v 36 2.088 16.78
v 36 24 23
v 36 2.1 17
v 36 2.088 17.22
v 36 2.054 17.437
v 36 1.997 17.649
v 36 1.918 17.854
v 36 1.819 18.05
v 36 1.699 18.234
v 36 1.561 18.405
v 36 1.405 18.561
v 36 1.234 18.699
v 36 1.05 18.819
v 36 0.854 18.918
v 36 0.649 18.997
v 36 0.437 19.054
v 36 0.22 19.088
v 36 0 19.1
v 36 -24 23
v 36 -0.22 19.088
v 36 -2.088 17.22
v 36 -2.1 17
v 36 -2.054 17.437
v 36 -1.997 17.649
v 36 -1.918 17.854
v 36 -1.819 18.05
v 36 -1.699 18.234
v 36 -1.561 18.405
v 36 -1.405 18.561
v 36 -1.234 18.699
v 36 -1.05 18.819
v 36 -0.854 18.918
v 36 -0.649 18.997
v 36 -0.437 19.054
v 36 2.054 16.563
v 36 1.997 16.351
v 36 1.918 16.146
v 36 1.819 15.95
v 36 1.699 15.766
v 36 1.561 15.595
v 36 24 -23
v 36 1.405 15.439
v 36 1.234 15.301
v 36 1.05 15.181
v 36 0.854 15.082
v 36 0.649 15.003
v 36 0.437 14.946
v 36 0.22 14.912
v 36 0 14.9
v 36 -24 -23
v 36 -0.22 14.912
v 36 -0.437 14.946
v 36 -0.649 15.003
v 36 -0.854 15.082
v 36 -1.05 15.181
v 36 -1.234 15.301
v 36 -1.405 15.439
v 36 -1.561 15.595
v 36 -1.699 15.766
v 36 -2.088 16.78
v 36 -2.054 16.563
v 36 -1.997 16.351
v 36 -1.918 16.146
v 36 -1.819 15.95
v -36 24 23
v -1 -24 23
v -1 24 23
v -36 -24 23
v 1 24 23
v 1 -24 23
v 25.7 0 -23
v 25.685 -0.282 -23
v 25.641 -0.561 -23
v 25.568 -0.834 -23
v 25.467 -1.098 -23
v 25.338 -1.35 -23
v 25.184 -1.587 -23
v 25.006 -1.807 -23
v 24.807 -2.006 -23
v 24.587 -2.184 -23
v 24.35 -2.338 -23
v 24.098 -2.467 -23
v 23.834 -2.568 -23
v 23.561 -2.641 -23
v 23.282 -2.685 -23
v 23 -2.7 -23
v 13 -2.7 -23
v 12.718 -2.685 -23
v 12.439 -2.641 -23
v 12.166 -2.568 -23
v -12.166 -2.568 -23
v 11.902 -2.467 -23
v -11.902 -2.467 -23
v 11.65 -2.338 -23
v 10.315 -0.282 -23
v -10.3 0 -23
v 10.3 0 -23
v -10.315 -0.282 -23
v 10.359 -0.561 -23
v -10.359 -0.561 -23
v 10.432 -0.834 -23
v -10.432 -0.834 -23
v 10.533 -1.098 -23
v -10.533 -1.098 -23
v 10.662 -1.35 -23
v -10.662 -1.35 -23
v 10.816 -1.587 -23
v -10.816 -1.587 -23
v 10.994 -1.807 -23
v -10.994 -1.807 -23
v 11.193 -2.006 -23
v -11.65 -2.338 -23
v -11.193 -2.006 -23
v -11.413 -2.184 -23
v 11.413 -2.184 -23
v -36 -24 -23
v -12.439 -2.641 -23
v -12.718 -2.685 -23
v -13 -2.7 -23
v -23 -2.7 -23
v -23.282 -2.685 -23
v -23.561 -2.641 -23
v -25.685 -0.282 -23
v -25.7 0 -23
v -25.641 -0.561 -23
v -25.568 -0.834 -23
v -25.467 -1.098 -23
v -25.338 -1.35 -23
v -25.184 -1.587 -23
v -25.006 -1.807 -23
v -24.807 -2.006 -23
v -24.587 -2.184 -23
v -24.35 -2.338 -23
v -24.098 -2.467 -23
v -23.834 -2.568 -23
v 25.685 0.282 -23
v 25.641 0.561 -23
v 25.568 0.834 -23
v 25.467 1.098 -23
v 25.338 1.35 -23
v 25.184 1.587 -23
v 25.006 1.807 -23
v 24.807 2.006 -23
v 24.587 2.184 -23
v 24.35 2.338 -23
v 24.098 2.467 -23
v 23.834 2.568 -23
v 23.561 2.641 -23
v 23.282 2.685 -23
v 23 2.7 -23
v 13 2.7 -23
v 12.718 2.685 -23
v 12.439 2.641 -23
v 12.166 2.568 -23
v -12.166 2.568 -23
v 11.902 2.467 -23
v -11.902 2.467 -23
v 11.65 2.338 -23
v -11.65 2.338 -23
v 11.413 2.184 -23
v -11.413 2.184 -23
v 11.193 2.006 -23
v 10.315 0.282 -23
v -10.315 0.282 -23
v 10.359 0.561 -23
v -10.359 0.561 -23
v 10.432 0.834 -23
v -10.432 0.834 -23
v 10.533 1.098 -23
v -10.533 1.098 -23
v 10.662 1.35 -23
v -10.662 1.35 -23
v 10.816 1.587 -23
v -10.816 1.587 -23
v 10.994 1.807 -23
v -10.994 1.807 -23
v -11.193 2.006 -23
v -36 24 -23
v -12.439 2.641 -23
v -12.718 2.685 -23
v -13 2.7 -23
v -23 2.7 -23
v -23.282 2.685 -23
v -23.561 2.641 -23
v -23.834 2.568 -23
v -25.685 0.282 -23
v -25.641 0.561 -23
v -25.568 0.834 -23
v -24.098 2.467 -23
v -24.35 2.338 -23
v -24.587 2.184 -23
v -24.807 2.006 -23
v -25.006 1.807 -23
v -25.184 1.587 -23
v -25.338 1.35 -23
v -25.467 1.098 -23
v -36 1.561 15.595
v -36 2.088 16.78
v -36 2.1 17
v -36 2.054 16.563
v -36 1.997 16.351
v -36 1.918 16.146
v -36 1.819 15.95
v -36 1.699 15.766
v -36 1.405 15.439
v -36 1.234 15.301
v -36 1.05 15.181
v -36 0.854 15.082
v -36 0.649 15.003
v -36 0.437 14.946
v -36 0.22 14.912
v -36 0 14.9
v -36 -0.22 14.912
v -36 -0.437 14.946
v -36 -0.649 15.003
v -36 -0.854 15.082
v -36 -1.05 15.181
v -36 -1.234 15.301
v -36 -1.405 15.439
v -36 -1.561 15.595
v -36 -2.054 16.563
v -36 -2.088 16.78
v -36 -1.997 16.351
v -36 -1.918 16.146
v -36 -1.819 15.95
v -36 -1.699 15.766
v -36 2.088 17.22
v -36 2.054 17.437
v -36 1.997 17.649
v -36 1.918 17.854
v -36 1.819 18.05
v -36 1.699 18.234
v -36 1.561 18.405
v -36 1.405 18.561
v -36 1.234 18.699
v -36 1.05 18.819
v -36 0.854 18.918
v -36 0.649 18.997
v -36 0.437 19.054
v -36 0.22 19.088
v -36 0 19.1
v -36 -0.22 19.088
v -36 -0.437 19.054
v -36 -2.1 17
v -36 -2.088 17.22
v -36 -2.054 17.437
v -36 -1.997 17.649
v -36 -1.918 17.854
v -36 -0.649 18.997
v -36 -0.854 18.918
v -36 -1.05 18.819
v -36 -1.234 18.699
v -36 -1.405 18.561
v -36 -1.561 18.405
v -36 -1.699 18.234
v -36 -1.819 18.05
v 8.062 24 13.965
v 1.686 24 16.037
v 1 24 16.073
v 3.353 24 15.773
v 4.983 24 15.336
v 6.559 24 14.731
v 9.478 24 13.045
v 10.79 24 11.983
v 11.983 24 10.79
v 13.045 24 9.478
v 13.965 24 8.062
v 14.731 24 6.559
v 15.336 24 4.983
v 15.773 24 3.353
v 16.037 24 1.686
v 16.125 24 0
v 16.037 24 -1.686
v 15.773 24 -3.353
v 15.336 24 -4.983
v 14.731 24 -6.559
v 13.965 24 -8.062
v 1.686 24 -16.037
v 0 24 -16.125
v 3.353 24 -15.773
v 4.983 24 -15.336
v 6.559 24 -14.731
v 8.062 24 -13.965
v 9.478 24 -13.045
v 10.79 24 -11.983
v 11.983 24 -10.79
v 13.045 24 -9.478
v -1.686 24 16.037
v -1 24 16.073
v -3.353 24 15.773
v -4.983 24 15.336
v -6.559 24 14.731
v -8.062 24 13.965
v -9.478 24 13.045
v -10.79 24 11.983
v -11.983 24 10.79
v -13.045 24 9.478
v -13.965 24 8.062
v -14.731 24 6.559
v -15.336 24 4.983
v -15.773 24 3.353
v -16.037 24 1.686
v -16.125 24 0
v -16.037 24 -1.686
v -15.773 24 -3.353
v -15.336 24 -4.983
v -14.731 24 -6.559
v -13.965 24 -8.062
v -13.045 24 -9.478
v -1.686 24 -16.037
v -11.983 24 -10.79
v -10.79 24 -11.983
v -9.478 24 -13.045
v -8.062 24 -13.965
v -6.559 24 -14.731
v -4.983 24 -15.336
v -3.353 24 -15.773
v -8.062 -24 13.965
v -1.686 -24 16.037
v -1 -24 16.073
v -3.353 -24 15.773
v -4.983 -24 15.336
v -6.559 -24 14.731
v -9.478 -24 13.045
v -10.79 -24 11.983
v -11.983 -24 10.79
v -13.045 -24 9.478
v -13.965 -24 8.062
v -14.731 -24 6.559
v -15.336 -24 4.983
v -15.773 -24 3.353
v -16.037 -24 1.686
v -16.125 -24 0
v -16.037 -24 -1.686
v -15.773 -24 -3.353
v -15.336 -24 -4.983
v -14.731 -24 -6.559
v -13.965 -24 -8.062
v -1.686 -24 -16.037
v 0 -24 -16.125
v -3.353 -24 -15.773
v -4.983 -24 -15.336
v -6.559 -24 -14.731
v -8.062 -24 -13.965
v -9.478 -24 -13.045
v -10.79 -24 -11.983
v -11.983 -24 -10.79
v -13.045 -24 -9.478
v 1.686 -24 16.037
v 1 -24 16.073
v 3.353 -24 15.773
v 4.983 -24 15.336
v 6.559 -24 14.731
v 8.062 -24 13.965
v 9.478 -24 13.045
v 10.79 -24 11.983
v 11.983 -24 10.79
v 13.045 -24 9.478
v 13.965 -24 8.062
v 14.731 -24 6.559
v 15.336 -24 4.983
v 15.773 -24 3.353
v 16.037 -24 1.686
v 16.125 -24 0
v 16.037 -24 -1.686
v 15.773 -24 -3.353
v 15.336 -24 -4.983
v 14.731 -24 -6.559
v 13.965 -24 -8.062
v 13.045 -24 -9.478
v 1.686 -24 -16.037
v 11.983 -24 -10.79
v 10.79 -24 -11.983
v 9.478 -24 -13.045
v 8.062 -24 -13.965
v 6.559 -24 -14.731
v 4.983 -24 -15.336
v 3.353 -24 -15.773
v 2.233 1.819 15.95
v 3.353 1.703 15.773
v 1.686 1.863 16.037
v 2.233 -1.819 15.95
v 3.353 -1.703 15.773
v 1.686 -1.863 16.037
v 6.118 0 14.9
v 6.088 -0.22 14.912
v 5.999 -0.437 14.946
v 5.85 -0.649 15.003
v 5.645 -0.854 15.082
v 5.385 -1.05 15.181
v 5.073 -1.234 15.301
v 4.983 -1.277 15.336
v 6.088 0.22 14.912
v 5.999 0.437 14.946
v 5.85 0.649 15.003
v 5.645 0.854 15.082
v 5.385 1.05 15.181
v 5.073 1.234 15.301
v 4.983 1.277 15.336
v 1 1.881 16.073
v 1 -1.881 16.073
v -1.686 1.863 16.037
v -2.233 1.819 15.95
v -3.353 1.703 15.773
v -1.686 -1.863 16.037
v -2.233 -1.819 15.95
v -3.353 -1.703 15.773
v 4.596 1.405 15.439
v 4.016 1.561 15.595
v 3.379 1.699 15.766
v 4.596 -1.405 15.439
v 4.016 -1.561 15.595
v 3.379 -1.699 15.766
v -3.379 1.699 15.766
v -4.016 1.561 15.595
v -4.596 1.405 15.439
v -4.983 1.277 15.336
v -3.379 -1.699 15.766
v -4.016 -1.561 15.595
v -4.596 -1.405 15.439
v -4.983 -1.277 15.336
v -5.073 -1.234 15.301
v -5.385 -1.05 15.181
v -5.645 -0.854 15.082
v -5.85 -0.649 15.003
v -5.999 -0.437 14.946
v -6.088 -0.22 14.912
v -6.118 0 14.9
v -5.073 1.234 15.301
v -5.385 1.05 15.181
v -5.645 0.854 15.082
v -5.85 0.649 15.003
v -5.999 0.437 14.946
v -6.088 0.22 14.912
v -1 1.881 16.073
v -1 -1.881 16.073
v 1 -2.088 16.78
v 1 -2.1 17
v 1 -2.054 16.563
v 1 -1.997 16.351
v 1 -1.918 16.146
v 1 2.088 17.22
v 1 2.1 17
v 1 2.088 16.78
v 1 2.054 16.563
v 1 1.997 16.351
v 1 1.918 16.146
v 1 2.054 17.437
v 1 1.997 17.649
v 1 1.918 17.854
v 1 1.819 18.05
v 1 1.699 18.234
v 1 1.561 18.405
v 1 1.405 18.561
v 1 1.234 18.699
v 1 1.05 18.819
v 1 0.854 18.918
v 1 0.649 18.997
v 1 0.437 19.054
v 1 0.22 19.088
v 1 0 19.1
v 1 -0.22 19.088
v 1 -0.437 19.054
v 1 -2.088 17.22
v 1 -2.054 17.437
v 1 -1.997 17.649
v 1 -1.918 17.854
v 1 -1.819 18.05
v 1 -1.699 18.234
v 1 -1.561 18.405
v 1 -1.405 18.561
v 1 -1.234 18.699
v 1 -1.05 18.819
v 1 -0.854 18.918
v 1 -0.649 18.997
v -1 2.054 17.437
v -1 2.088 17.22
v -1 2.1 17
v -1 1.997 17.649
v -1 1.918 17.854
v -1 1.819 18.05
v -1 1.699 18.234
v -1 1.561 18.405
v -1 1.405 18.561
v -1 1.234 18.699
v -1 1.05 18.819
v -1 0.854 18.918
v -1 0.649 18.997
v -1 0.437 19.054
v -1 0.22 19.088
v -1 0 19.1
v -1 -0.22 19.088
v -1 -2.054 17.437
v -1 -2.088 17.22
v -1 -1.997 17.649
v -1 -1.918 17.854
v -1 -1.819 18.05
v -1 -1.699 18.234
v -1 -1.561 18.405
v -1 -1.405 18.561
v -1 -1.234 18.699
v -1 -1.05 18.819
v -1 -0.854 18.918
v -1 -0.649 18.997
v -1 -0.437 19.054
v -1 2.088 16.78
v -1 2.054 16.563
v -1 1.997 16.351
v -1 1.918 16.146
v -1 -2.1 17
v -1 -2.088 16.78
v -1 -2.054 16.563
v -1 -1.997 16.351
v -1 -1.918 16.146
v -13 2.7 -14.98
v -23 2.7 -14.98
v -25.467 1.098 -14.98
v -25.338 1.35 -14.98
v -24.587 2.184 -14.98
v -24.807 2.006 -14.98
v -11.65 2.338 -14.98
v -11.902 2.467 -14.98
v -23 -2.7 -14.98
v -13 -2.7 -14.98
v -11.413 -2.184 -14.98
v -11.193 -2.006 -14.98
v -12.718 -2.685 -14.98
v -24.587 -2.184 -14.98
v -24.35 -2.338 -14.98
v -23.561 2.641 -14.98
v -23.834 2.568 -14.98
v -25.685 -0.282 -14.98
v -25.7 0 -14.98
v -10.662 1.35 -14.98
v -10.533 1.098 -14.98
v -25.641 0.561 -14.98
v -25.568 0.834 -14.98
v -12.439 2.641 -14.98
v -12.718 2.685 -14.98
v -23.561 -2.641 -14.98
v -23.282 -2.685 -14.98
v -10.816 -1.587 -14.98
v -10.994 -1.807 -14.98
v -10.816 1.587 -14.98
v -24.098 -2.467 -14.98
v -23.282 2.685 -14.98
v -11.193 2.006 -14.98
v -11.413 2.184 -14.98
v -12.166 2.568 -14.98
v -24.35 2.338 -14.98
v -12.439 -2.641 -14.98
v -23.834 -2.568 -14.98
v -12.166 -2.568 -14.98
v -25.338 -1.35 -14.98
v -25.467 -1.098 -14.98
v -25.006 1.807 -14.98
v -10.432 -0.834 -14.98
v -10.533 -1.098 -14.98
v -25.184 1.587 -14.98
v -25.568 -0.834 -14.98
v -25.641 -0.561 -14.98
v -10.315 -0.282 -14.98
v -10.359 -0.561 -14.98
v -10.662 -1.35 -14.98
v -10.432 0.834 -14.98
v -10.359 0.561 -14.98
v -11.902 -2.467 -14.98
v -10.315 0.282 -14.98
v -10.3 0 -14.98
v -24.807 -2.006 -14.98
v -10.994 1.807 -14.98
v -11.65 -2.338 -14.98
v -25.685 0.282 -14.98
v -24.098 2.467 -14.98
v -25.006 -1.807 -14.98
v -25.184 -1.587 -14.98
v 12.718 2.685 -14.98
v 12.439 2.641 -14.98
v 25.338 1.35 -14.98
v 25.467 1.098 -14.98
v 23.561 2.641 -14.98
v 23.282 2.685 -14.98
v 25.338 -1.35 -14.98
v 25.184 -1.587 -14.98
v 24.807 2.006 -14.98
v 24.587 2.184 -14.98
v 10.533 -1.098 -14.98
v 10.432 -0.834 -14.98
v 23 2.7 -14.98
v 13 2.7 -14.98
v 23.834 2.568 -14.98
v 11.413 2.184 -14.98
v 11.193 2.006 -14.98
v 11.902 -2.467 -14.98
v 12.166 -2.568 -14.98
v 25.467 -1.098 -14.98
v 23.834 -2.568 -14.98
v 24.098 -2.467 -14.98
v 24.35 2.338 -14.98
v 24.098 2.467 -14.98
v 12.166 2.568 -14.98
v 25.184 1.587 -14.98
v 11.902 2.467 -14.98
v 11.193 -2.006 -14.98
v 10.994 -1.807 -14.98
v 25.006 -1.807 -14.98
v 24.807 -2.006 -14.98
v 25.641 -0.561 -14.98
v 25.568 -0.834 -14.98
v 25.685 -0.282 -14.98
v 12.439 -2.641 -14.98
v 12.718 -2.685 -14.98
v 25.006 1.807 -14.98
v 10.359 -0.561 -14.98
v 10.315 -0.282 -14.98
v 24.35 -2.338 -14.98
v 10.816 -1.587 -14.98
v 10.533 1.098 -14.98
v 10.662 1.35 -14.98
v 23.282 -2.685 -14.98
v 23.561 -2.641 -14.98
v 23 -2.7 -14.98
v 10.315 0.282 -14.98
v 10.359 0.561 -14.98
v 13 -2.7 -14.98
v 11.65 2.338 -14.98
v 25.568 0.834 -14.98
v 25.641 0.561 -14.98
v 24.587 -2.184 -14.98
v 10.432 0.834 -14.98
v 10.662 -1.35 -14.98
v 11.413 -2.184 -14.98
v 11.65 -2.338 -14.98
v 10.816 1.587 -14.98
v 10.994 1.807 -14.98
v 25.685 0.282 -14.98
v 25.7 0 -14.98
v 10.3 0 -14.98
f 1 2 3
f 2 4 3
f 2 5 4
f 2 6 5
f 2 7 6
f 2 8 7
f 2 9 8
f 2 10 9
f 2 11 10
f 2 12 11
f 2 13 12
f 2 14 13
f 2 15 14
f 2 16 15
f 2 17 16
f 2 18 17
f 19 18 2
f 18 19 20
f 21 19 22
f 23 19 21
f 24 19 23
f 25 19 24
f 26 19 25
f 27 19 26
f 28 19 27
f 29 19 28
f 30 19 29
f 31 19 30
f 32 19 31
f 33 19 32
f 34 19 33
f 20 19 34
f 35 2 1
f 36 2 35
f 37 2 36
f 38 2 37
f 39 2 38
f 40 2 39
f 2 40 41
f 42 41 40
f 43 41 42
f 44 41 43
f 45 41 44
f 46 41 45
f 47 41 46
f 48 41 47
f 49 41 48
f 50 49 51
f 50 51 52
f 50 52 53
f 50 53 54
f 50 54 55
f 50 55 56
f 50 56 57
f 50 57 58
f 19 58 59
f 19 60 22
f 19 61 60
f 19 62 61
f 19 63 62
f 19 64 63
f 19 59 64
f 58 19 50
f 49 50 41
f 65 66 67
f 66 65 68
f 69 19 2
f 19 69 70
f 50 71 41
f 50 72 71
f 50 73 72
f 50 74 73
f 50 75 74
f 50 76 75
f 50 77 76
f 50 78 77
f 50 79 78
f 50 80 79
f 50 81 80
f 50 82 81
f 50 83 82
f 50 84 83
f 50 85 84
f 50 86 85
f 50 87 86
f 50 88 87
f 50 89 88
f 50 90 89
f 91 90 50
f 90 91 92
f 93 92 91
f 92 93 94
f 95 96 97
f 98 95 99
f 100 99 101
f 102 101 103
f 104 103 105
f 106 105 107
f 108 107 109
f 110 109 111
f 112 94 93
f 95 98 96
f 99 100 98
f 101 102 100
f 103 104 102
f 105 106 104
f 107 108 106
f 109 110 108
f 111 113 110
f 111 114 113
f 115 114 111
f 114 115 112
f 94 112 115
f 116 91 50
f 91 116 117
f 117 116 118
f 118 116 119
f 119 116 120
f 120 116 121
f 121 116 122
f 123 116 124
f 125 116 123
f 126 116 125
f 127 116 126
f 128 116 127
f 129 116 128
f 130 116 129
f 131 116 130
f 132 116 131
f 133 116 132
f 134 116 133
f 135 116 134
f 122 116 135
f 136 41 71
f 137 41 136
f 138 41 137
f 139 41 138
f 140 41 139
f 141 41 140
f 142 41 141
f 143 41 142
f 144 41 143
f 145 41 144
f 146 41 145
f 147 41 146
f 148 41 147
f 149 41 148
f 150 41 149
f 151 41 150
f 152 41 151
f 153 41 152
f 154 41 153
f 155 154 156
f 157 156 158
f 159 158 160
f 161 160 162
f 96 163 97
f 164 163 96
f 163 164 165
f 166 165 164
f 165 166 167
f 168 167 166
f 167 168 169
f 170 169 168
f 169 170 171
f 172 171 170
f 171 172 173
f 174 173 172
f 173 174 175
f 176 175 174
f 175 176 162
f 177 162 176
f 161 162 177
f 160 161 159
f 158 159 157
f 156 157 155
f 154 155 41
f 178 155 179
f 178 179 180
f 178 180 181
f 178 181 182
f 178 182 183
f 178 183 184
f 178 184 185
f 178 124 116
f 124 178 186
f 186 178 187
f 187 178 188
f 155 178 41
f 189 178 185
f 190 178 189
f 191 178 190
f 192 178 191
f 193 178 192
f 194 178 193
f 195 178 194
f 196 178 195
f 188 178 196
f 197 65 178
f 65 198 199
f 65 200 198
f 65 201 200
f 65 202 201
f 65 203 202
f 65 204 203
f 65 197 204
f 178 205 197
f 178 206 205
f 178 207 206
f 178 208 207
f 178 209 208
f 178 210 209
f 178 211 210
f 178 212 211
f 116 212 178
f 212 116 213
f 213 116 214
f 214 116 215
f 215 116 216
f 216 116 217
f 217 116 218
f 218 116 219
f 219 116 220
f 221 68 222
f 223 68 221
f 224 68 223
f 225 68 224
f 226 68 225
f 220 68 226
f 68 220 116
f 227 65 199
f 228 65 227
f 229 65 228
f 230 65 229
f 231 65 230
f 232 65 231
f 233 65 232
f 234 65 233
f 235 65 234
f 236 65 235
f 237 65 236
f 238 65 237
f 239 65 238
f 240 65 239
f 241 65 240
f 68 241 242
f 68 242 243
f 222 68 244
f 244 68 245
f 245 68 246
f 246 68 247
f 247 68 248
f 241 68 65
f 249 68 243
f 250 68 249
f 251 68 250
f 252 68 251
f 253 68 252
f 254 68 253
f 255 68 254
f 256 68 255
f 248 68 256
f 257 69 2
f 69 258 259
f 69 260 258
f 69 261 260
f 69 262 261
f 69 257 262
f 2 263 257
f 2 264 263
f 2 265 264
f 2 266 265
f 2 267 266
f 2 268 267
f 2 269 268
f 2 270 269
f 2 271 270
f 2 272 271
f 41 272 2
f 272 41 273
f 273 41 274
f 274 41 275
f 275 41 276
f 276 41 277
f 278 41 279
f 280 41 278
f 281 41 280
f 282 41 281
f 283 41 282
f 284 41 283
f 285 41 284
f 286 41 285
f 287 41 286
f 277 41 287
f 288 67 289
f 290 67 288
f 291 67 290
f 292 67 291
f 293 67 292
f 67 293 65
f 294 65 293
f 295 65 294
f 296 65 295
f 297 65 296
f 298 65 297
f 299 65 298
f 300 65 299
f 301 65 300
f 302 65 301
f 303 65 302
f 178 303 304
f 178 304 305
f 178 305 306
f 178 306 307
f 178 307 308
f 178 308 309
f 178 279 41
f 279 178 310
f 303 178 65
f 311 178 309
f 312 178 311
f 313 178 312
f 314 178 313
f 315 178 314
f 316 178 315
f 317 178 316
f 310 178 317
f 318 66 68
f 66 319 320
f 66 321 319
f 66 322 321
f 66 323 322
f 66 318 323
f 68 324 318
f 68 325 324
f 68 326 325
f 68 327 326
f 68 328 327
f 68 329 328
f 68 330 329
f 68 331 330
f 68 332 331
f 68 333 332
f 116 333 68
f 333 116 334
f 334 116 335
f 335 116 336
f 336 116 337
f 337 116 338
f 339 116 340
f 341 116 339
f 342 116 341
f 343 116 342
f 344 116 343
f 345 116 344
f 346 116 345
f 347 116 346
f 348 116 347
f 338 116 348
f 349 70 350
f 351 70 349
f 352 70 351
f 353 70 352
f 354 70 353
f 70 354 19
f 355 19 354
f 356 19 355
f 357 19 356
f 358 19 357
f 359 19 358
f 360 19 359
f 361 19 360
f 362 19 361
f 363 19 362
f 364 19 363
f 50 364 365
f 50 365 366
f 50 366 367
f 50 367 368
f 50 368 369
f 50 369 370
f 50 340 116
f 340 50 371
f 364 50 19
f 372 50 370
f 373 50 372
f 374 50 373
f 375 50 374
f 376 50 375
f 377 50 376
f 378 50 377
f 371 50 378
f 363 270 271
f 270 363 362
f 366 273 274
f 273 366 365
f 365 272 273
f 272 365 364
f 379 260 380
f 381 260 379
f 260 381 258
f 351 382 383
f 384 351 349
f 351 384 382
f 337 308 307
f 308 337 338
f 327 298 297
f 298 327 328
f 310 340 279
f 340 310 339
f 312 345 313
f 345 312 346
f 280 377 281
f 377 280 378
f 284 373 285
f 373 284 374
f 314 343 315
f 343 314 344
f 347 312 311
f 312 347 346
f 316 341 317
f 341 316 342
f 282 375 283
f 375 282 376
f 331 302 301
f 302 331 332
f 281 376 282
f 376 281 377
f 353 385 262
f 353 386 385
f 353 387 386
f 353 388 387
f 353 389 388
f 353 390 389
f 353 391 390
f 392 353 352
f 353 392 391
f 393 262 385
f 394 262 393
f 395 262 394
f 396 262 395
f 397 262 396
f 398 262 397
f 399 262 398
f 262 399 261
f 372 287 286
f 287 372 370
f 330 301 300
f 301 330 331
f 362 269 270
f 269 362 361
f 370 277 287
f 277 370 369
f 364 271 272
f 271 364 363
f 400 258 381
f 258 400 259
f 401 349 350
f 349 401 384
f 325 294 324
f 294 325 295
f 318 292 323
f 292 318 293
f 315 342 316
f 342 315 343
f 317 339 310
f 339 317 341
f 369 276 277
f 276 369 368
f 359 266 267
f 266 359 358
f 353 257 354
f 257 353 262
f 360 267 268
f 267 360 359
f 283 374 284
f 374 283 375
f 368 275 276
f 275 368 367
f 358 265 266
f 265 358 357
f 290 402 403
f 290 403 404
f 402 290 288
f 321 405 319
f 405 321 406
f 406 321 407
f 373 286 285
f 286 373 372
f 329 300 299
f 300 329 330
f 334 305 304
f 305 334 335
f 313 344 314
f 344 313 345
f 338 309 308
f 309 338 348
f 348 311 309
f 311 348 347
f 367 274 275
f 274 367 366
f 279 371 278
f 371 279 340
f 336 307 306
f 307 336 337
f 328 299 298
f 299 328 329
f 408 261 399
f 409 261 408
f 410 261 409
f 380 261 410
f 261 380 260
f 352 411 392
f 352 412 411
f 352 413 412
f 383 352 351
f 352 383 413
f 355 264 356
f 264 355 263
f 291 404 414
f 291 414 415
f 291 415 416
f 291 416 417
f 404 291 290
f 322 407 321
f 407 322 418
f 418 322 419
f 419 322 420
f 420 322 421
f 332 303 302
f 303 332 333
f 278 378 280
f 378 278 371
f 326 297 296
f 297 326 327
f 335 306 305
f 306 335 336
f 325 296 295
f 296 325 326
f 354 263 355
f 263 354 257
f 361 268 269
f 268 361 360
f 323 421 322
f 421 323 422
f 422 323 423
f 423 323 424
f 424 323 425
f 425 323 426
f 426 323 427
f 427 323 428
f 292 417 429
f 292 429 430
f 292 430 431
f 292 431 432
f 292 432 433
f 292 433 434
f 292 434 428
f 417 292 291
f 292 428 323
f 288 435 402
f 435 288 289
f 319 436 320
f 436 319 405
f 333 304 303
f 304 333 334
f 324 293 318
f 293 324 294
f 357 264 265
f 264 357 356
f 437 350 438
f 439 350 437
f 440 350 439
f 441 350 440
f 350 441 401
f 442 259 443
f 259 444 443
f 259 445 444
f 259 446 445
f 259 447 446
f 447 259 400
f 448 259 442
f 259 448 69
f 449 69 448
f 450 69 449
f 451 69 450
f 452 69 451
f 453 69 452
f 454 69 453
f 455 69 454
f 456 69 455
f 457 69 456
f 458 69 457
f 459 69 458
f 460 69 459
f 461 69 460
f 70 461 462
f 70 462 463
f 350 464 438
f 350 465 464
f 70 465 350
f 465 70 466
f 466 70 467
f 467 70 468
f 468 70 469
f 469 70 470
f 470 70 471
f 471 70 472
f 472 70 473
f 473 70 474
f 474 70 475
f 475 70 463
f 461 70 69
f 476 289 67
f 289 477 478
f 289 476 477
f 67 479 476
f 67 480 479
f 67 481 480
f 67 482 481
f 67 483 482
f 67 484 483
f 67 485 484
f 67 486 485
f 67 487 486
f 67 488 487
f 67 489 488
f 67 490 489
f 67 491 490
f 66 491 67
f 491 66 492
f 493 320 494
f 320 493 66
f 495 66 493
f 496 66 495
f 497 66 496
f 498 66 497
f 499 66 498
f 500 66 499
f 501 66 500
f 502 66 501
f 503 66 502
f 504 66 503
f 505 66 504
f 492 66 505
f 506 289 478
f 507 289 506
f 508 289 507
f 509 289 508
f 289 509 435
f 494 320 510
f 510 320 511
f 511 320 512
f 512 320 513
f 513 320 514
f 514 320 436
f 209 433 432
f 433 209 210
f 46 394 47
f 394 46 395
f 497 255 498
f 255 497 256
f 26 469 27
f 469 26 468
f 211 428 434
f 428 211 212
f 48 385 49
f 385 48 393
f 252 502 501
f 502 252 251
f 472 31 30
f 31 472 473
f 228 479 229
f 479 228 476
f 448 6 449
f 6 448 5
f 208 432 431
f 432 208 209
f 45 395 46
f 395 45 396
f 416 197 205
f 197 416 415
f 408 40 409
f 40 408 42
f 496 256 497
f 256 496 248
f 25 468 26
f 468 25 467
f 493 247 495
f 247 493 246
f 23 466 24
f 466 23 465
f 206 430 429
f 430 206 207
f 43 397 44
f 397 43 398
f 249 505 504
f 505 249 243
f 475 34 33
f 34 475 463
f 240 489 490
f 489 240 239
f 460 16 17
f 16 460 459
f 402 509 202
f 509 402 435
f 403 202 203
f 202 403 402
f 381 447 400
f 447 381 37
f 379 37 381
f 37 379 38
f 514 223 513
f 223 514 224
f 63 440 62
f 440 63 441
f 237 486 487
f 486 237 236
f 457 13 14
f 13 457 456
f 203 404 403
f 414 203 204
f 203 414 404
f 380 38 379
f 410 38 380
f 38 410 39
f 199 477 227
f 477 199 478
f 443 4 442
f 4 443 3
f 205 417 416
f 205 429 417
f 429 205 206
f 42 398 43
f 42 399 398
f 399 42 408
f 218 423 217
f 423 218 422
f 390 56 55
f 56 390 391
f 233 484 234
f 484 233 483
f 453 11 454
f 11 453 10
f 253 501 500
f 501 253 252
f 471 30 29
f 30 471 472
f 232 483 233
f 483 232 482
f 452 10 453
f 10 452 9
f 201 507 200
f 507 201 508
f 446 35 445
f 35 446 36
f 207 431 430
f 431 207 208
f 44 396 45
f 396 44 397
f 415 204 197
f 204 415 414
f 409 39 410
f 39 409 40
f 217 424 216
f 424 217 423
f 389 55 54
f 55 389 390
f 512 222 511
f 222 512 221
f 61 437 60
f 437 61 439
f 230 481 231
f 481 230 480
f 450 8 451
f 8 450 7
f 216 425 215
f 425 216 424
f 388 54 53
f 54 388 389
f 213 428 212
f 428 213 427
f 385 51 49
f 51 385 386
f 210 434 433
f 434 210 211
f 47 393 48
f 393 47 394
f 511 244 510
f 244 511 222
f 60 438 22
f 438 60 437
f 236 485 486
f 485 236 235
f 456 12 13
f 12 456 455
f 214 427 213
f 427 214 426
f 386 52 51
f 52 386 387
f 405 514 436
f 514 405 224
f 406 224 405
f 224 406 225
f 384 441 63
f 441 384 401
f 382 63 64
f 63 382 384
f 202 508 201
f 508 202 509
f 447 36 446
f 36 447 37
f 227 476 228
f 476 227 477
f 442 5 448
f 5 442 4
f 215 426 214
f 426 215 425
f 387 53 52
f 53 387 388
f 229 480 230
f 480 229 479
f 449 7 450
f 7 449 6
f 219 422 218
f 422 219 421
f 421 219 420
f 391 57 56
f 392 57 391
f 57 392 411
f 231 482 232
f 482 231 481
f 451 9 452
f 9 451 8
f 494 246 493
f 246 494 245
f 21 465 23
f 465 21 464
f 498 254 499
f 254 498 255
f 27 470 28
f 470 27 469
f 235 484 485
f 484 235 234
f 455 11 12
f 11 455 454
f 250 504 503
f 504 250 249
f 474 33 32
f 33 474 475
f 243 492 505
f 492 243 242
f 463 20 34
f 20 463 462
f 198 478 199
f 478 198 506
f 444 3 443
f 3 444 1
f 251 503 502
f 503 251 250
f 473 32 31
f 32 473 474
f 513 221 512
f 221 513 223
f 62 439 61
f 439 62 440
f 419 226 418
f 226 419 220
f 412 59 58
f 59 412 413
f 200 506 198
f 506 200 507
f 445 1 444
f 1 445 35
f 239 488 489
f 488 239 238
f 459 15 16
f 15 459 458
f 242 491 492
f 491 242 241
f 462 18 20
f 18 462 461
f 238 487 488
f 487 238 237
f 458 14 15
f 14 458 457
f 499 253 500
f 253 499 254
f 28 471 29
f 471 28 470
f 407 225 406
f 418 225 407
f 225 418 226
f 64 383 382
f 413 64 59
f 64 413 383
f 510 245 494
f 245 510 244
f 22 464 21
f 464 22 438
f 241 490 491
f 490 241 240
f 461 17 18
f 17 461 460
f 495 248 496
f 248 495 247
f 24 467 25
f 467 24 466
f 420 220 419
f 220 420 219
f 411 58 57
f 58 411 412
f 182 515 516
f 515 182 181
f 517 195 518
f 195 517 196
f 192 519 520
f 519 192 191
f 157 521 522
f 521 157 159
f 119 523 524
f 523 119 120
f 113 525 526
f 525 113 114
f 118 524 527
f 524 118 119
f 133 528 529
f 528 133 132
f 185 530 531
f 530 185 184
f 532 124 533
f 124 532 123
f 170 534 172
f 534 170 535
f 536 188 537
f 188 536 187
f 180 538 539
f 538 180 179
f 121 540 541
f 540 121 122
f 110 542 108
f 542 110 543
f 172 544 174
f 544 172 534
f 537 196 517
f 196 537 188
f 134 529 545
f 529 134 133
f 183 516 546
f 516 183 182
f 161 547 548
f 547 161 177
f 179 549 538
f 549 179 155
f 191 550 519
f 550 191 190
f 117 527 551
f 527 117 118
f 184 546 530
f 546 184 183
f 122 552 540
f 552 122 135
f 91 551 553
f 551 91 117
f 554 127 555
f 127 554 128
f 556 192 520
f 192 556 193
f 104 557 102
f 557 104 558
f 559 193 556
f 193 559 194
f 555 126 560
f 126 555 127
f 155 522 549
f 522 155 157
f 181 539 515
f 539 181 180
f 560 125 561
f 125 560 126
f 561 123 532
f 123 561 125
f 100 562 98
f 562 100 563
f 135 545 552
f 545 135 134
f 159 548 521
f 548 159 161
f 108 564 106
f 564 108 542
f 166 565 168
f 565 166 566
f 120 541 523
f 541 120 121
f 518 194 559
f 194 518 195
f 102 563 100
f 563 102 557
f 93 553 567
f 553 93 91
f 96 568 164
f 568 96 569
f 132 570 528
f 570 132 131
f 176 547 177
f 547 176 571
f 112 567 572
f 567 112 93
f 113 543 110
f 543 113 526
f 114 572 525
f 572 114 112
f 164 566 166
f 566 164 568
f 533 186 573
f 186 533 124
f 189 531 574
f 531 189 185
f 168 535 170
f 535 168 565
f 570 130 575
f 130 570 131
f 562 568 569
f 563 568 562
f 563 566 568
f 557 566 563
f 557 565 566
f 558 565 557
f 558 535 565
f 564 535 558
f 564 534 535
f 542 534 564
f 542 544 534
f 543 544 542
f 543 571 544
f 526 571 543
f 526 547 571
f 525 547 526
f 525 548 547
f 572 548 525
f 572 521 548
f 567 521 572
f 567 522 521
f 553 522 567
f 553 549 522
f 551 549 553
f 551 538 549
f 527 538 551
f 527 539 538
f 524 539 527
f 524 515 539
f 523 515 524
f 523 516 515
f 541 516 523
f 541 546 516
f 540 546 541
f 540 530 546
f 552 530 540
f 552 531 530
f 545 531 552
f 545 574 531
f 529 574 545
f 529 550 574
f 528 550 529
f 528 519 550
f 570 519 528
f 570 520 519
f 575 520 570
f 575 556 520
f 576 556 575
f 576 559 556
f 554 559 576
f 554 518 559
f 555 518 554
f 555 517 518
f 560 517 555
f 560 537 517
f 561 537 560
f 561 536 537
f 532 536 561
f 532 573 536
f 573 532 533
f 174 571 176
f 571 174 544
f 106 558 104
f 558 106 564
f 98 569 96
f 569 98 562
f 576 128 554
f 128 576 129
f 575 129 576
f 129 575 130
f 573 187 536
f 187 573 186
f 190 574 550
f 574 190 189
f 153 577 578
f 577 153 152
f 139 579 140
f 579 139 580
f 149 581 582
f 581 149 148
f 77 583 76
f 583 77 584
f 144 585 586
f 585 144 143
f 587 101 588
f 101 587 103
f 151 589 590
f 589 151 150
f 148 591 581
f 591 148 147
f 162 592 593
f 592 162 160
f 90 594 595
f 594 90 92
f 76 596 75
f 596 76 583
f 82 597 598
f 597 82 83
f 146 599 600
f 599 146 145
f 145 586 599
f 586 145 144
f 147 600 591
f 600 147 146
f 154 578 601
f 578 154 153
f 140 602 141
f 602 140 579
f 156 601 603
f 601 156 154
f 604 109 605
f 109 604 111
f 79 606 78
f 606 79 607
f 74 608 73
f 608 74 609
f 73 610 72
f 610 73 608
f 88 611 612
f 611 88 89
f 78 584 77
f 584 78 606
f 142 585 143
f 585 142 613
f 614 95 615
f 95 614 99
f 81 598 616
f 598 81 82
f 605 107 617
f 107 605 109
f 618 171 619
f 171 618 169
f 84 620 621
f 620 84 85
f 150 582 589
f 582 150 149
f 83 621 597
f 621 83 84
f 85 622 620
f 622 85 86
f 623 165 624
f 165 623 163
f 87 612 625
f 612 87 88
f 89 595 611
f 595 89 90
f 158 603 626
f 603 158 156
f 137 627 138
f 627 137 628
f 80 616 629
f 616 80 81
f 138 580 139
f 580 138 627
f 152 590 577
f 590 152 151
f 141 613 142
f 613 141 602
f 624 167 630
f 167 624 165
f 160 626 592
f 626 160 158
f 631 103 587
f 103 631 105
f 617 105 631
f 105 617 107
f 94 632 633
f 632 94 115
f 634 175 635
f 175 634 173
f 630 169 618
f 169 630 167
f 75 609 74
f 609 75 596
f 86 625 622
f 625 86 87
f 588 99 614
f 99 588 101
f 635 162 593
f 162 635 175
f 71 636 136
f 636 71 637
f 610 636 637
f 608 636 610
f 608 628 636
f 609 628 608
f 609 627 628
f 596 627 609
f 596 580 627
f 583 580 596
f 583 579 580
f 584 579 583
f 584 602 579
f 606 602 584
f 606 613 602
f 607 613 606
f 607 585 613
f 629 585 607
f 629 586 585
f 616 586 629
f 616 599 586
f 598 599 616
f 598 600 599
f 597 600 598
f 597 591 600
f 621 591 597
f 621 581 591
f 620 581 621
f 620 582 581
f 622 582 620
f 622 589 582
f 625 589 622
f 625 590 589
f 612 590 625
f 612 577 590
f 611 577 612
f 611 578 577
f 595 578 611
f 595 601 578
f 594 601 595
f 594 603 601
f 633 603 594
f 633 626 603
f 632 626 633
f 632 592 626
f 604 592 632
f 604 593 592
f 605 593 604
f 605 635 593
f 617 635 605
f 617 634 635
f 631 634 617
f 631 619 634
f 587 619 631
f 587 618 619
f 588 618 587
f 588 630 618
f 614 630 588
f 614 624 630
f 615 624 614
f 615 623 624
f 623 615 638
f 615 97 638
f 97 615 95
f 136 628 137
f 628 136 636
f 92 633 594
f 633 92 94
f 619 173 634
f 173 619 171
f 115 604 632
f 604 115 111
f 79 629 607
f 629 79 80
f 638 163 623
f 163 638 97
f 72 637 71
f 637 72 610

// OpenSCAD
// Split housing for 32 mm OD linear bearing.
$fn = 60;
eps = 0.02;
bearing_d = 32;
body_l = 72;
body_d = 48;
body_h = 46;
slot_w = 2;
module mount_slot(x) {
    hull() {
        translate([x - 5, 0, -body_h / 2 - eps]) cylinder(d = 5.4, h = 8 + 2 * eps);
        translate([x + 5, 0, -body_h / 2 - eps]) cylinder(d = 5.4, h = 8 + 2 * eps);
    }
}
difference() {
    cube([body_l, body_d, body_h], center = true);
    translate([0, -body_d / 2 - eps, 0]) rotate([-90, 0, 0]) cylinder(d = bearing_d + 0.25, h = body_d + 2 * eps);
    translate([-slot_w / 2, -body_d / 2 - eps, 0]) cube([slot_w, body_d + 2 * eps, body_h / 2 + eps]);
    translate([-body_l / 2 - eps, 0, body_h / 2 - 6]) rotate([0, 90, 0]) cylinder(d = 4.2, h = body_l + 2 * eps);
    mount_slot(-body_l / 4);
    mount_slot(body_l / 4);
}
